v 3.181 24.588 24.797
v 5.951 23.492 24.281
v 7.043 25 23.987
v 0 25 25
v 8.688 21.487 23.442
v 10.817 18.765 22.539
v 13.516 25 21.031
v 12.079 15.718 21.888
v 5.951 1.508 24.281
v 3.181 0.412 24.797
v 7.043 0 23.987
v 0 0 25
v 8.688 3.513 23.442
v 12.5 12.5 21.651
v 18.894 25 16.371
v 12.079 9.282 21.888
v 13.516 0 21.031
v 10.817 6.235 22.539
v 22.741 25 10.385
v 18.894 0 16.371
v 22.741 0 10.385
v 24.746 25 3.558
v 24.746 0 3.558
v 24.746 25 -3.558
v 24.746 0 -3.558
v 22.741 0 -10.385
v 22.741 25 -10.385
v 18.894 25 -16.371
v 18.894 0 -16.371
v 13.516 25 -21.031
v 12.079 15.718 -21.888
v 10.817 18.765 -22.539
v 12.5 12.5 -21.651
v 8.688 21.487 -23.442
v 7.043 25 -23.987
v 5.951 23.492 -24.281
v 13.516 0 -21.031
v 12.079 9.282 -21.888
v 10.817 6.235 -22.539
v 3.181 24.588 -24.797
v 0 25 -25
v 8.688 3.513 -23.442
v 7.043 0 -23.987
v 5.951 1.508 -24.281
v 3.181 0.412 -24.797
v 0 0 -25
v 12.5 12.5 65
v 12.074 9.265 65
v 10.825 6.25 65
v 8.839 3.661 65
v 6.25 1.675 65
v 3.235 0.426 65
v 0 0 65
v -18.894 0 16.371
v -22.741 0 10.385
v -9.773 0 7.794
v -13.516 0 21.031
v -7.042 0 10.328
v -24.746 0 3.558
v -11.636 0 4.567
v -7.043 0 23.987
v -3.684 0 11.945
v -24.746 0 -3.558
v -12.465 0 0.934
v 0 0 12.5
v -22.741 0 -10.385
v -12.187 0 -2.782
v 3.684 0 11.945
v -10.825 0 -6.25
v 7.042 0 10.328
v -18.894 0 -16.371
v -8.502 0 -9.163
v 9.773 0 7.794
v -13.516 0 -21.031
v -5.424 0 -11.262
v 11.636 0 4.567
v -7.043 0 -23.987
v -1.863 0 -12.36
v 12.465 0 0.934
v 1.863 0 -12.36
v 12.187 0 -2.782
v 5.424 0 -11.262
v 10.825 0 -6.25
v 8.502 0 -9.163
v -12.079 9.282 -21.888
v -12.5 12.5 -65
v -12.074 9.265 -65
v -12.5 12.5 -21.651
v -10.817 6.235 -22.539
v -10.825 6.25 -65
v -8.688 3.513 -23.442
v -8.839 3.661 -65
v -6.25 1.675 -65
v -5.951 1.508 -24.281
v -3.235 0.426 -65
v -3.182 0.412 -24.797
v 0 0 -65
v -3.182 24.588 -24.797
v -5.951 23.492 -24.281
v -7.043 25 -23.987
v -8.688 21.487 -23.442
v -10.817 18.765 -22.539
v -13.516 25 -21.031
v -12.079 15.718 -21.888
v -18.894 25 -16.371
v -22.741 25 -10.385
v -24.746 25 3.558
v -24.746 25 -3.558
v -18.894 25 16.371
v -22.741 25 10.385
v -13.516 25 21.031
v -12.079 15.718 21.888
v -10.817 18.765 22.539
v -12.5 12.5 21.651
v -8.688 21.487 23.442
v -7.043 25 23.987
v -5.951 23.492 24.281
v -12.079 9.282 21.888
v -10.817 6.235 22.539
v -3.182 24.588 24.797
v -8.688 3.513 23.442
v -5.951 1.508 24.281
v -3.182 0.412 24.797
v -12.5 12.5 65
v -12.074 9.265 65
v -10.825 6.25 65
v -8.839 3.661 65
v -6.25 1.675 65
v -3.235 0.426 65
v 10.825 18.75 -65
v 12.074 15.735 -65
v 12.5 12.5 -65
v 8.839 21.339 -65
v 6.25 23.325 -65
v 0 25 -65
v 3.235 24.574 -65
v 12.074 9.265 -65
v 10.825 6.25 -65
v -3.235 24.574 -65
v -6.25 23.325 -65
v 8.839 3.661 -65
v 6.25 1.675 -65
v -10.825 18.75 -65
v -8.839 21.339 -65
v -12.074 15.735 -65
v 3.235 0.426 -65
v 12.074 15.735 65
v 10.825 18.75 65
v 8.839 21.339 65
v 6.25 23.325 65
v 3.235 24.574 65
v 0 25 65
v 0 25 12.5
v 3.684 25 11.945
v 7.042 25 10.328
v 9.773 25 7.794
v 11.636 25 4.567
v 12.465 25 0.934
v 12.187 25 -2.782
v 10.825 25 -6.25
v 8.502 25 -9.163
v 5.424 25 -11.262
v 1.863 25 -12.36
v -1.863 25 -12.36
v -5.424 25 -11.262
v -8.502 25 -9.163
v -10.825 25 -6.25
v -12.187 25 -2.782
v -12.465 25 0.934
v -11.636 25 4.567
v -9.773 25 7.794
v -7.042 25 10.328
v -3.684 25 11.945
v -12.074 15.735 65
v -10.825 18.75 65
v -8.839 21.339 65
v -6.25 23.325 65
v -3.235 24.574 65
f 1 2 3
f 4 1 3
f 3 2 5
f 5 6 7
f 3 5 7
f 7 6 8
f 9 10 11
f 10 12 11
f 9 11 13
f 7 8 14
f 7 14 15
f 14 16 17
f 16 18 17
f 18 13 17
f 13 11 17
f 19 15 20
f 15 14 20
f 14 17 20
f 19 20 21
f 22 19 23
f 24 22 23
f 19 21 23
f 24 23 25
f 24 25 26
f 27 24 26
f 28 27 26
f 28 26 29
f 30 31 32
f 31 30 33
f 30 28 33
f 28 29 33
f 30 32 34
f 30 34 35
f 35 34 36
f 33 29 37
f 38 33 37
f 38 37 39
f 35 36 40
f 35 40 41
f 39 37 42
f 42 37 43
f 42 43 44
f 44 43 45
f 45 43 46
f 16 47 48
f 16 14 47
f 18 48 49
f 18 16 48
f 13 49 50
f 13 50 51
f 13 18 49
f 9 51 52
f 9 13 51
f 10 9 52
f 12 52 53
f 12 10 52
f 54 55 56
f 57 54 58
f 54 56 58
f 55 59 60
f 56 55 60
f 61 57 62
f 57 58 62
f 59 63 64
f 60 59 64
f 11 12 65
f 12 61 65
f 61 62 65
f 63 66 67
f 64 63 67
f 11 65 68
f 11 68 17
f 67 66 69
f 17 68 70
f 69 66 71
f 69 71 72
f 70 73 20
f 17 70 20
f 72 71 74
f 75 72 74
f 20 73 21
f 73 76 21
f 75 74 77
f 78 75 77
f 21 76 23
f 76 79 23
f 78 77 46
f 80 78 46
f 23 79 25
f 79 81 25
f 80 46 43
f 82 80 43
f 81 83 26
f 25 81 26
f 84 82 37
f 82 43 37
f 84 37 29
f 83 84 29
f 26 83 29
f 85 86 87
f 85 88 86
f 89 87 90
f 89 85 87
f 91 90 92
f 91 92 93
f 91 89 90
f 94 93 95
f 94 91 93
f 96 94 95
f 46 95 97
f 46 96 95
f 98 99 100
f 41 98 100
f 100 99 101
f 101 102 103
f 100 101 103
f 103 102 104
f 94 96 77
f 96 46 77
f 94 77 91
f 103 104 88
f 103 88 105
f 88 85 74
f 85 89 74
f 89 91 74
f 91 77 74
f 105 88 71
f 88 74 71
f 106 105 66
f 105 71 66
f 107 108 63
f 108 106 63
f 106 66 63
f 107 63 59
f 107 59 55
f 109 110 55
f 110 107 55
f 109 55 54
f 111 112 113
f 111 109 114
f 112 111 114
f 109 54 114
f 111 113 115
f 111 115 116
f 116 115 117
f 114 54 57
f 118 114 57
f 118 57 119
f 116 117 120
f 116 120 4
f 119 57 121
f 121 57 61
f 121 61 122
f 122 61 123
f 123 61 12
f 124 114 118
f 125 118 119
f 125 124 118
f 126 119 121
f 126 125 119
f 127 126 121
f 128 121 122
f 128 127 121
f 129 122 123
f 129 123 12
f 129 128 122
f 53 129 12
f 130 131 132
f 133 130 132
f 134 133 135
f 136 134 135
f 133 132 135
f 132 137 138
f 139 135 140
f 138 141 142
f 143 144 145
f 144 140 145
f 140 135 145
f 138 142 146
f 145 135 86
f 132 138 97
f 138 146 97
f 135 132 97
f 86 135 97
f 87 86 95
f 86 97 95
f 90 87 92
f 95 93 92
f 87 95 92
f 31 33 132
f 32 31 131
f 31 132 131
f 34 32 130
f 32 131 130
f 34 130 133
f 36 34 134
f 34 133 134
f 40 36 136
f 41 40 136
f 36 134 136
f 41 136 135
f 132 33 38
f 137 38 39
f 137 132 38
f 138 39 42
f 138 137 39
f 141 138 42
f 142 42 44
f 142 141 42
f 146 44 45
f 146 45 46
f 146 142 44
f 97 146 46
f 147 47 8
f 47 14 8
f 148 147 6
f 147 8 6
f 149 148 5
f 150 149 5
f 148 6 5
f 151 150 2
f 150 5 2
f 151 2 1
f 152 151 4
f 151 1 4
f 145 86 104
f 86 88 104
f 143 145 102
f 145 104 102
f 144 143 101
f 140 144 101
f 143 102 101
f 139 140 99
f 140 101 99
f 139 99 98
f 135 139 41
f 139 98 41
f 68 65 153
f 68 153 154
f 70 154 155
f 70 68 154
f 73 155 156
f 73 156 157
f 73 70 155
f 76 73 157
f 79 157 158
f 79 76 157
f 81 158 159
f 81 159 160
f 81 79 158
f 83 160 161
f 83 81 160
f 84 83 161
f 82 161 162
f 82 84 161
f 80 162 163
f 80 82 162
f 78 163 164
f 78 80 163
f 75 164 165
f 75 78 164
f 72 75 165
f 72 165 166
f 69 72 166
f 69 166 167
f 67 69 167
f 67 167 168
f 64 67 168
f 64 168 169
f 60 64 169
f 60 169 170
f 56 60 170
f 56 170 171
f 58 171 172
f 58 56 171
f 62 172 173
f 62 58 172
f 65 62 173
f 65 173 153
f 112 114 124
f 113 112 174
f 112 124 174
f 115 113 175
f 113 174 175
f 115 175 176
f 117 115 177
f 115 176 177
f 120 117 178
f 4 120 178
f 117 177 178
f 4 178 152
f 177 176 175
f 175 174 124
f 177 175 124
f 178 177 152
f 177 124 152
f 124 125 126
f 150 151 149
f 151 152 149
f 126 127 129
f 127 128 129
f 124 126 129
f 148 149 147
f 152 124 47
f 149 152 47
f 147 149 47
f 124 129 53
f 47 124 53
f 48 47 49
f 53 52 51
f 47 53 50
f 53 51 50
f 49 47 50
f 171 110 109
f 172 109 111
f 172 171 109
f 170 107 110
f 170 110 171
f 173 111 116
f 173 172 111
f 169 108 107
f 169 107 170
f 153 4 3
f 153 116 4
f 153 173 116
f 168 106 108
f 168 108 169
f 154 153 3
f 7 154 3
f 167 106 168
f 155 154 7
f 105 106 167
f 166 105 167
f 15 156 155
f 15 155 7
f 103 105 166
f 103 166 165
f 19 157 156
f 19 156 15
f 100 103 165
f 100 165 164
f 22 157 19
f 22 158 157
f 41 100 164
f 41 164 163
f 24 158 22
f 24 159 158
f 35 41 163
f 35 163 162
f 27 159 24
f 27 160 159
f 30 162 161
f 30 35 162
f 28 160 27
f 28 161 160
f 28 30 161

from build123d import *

# Parameters (mm, degrees)
ESBO_O1_R                = 12.5
RESSALTO_EXTRUS_O1_DEPTH = 25
FILETE1_R                = 12.5


with BuildPart() as part:
    # Esboço1 → Ressalto-extrusão1 (new body)
    with BuildSketch(Plane(origin=(0, 0, 0), x_dir=(1, 0, 0), z_dir=(0, 1, 0))):
        with BuildLine():
            Line((-12.5, -21.650635095), (-12.5, -65))
            Line((-12.5, -65), (12.5, -65))
            Line((12.5, -65), (12.5, -21.650635095))
            ThreePointArc((12.5, -21.650635095), (25, 0), (12.5, 21.650635095))
            Line((12.5, 21.650635095), (12.5, 65))
            Line((12.5, 65), (-12.5, 65))
            Line((-12.5, 65), (-12.5, 21.650635095))
            ThreePointArc((-12.5, 21.650635095), (-25, 0), (-12.5, -21.650635095))
        make_face()
        with Locations(Location((0, 0, 0), (0, 0, 270))):
            Circle(ESBO_O1_R, mode=Mode.SUBTRACT)
    extrude(amount=RESSALTO_EXTRUS_O1_DEPTH)

    # Filete1
    filete1_edges = [part.edges().sort_by_distance(p)[0] for p in [
        (-12.5, 0, -43.325317547),
        (12.5, 0, -43.325317547),
        (-12.5, 25, -43.325317547),
        (12.5, 25, -43.325317547),
        (-12.5, 0, 43.325317547),
        (12.5, 0, 43.325317547),
        (12.5, 25, 43.325317547),
        (-12.5, 25, 43.325317547),
    ]]
    fillet(filete1_edges, radius=FILETE1_R - 0.0001)  # a hair under: the kernel refuses the full size


solid = part.part
